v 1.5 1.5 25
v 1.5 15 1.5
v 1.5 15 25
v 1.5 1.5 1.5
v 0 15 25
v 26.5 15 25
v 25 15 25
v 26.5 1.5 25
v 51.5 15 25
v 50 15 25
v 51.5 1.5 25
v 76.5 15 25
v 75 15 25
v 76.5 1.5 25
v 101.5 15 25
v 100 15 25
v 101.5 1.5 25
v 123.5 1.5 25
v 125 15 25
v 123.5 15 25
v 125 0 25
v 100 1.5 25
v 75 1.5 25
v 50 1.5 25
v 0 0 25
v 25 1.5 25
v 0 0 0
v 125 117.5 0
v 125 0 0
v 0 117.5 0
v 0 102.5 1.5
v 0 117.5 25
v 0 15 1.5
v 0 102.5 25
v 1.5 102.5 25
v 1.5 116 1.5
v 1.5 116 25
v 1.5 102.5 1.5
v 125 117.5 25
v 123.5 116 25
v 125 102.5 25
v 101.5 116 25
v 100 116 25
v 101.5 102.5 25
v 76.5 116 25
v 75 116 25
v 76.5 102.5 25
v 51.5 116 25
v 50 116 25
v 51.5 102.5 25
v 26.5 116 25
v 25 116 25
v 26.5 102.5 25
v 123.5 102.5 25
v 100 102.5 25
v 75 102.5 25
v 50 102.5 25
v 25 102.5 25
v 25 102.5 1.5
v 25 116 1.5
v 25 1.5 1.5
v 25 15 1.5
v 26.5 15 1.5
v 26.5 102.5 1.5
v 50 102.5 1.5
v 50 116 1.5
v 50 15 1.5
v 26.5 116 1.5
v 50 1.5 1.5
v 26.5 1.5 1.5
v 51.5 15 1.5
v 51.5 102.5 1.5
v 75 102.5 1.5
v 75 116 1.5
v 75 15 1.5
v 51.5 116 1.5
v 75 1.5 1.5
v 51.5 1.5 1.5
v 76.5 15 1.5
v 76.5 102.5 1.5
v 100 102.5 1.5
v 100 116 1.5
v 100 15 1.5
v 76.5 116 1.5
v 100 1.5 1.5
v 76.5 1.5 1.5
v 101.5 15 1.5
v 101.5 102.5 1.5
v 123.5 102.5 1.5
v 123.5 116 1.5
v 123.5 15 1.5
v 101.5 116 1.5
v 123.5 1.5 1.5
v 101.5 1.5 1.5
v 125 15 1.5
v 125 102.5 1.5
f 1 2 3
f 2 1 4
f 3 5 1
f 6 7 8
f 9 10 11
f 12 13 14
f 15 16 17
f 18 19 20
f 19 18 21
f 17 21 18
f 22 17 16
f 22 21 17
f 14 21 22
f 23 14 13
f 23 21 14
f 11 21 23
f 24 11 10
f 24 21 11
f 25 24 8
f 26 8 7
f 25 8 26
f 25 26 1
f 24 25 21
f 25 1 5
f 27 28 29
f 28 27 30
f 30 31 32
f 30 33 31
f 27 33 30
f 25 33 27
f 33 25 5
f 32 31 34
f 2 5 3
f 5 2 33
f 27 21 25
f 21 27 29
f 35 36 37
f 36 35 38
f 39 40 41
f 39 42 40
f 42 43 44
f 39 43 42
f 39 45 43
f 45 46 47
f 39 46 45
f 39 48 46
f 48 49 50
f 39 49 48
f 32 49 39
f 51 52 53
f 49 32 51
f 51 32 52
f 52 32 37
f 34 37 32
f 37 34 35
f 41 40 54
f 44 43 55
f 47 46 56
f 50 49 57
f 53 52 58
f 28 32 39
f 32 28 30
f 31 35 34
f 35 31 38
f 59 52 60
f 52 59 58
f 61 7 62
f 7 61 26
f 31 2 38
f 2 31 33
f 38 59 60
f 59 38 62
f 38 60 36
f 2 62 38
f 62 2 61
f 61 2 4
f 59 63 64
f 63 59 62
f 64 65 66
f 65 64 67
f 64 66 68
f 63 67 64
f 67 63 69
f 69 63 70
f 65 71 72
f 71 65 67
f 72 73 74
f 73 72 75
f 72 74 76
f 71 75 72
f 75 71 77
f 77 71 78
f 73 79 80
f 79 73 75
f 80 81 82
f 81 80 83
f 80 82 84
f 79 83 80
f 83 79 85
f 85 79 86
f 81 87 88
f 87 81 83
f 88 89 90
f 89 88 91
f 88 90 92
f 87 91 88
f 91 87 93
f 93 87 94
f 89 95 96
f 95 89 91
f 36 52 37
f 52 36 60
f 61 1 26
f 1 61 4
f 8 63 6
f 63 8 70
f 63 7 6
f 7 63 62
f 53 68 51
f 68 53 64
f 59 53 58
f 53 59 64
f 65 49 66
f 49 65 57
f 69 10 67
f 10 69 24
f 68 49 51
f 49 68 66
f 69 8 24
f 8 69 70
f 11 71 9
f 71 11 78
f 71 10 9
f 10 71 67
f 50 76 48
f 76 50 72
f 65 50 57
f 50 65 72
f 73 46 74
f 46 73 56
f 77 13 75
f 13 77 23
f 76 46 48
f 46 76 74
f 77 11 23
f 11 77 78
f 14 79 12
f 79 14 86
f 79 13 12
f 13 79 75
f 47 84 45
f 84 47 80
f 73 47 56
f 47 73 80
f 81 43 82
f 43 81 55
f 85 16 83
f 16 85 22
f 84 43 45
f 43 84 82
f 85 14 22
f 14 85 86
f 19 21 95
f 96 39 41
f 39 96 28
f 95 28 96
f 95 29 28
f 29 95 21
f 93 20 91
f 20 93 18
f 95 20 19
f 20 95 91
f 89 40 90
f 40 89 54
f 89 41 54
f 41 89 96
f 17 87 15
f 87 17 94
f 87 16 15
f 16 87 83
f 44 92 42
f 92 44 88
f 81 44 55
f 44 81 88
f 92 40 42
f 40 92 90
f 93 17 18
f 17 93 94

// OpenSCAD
width = 116;
height = 25;
length = 25;
width_small = 15;
thick = 1.5;
n = 5;

module block(x,y,end) {
    translate([x,0,0])
    union() {
        translate([0,0,0]) cube([thick, width_small, height]);
        translate([0,width-width_small+thick,0]) cube([thick, width_small, height]);
        if (end) {
            translate([length-thick,0,0]) cube([thick, width_small, height]);
            translate([length-thick,width-width_small+thick,0]) cube([thick, width_small, height]);
        }
        cube([length, width, thick]);
        cube([length, thick, height]);
        translate([0,width,0]) cube([length, thick, height]);
    }
}

//cube([thick, width, height]);
end = false;
for(c = [0:1:n-1]) {
    block(c*length,0,c==n-1);
}
//translate([n*length-thick,0,0]) cube([thick, width, height]);
